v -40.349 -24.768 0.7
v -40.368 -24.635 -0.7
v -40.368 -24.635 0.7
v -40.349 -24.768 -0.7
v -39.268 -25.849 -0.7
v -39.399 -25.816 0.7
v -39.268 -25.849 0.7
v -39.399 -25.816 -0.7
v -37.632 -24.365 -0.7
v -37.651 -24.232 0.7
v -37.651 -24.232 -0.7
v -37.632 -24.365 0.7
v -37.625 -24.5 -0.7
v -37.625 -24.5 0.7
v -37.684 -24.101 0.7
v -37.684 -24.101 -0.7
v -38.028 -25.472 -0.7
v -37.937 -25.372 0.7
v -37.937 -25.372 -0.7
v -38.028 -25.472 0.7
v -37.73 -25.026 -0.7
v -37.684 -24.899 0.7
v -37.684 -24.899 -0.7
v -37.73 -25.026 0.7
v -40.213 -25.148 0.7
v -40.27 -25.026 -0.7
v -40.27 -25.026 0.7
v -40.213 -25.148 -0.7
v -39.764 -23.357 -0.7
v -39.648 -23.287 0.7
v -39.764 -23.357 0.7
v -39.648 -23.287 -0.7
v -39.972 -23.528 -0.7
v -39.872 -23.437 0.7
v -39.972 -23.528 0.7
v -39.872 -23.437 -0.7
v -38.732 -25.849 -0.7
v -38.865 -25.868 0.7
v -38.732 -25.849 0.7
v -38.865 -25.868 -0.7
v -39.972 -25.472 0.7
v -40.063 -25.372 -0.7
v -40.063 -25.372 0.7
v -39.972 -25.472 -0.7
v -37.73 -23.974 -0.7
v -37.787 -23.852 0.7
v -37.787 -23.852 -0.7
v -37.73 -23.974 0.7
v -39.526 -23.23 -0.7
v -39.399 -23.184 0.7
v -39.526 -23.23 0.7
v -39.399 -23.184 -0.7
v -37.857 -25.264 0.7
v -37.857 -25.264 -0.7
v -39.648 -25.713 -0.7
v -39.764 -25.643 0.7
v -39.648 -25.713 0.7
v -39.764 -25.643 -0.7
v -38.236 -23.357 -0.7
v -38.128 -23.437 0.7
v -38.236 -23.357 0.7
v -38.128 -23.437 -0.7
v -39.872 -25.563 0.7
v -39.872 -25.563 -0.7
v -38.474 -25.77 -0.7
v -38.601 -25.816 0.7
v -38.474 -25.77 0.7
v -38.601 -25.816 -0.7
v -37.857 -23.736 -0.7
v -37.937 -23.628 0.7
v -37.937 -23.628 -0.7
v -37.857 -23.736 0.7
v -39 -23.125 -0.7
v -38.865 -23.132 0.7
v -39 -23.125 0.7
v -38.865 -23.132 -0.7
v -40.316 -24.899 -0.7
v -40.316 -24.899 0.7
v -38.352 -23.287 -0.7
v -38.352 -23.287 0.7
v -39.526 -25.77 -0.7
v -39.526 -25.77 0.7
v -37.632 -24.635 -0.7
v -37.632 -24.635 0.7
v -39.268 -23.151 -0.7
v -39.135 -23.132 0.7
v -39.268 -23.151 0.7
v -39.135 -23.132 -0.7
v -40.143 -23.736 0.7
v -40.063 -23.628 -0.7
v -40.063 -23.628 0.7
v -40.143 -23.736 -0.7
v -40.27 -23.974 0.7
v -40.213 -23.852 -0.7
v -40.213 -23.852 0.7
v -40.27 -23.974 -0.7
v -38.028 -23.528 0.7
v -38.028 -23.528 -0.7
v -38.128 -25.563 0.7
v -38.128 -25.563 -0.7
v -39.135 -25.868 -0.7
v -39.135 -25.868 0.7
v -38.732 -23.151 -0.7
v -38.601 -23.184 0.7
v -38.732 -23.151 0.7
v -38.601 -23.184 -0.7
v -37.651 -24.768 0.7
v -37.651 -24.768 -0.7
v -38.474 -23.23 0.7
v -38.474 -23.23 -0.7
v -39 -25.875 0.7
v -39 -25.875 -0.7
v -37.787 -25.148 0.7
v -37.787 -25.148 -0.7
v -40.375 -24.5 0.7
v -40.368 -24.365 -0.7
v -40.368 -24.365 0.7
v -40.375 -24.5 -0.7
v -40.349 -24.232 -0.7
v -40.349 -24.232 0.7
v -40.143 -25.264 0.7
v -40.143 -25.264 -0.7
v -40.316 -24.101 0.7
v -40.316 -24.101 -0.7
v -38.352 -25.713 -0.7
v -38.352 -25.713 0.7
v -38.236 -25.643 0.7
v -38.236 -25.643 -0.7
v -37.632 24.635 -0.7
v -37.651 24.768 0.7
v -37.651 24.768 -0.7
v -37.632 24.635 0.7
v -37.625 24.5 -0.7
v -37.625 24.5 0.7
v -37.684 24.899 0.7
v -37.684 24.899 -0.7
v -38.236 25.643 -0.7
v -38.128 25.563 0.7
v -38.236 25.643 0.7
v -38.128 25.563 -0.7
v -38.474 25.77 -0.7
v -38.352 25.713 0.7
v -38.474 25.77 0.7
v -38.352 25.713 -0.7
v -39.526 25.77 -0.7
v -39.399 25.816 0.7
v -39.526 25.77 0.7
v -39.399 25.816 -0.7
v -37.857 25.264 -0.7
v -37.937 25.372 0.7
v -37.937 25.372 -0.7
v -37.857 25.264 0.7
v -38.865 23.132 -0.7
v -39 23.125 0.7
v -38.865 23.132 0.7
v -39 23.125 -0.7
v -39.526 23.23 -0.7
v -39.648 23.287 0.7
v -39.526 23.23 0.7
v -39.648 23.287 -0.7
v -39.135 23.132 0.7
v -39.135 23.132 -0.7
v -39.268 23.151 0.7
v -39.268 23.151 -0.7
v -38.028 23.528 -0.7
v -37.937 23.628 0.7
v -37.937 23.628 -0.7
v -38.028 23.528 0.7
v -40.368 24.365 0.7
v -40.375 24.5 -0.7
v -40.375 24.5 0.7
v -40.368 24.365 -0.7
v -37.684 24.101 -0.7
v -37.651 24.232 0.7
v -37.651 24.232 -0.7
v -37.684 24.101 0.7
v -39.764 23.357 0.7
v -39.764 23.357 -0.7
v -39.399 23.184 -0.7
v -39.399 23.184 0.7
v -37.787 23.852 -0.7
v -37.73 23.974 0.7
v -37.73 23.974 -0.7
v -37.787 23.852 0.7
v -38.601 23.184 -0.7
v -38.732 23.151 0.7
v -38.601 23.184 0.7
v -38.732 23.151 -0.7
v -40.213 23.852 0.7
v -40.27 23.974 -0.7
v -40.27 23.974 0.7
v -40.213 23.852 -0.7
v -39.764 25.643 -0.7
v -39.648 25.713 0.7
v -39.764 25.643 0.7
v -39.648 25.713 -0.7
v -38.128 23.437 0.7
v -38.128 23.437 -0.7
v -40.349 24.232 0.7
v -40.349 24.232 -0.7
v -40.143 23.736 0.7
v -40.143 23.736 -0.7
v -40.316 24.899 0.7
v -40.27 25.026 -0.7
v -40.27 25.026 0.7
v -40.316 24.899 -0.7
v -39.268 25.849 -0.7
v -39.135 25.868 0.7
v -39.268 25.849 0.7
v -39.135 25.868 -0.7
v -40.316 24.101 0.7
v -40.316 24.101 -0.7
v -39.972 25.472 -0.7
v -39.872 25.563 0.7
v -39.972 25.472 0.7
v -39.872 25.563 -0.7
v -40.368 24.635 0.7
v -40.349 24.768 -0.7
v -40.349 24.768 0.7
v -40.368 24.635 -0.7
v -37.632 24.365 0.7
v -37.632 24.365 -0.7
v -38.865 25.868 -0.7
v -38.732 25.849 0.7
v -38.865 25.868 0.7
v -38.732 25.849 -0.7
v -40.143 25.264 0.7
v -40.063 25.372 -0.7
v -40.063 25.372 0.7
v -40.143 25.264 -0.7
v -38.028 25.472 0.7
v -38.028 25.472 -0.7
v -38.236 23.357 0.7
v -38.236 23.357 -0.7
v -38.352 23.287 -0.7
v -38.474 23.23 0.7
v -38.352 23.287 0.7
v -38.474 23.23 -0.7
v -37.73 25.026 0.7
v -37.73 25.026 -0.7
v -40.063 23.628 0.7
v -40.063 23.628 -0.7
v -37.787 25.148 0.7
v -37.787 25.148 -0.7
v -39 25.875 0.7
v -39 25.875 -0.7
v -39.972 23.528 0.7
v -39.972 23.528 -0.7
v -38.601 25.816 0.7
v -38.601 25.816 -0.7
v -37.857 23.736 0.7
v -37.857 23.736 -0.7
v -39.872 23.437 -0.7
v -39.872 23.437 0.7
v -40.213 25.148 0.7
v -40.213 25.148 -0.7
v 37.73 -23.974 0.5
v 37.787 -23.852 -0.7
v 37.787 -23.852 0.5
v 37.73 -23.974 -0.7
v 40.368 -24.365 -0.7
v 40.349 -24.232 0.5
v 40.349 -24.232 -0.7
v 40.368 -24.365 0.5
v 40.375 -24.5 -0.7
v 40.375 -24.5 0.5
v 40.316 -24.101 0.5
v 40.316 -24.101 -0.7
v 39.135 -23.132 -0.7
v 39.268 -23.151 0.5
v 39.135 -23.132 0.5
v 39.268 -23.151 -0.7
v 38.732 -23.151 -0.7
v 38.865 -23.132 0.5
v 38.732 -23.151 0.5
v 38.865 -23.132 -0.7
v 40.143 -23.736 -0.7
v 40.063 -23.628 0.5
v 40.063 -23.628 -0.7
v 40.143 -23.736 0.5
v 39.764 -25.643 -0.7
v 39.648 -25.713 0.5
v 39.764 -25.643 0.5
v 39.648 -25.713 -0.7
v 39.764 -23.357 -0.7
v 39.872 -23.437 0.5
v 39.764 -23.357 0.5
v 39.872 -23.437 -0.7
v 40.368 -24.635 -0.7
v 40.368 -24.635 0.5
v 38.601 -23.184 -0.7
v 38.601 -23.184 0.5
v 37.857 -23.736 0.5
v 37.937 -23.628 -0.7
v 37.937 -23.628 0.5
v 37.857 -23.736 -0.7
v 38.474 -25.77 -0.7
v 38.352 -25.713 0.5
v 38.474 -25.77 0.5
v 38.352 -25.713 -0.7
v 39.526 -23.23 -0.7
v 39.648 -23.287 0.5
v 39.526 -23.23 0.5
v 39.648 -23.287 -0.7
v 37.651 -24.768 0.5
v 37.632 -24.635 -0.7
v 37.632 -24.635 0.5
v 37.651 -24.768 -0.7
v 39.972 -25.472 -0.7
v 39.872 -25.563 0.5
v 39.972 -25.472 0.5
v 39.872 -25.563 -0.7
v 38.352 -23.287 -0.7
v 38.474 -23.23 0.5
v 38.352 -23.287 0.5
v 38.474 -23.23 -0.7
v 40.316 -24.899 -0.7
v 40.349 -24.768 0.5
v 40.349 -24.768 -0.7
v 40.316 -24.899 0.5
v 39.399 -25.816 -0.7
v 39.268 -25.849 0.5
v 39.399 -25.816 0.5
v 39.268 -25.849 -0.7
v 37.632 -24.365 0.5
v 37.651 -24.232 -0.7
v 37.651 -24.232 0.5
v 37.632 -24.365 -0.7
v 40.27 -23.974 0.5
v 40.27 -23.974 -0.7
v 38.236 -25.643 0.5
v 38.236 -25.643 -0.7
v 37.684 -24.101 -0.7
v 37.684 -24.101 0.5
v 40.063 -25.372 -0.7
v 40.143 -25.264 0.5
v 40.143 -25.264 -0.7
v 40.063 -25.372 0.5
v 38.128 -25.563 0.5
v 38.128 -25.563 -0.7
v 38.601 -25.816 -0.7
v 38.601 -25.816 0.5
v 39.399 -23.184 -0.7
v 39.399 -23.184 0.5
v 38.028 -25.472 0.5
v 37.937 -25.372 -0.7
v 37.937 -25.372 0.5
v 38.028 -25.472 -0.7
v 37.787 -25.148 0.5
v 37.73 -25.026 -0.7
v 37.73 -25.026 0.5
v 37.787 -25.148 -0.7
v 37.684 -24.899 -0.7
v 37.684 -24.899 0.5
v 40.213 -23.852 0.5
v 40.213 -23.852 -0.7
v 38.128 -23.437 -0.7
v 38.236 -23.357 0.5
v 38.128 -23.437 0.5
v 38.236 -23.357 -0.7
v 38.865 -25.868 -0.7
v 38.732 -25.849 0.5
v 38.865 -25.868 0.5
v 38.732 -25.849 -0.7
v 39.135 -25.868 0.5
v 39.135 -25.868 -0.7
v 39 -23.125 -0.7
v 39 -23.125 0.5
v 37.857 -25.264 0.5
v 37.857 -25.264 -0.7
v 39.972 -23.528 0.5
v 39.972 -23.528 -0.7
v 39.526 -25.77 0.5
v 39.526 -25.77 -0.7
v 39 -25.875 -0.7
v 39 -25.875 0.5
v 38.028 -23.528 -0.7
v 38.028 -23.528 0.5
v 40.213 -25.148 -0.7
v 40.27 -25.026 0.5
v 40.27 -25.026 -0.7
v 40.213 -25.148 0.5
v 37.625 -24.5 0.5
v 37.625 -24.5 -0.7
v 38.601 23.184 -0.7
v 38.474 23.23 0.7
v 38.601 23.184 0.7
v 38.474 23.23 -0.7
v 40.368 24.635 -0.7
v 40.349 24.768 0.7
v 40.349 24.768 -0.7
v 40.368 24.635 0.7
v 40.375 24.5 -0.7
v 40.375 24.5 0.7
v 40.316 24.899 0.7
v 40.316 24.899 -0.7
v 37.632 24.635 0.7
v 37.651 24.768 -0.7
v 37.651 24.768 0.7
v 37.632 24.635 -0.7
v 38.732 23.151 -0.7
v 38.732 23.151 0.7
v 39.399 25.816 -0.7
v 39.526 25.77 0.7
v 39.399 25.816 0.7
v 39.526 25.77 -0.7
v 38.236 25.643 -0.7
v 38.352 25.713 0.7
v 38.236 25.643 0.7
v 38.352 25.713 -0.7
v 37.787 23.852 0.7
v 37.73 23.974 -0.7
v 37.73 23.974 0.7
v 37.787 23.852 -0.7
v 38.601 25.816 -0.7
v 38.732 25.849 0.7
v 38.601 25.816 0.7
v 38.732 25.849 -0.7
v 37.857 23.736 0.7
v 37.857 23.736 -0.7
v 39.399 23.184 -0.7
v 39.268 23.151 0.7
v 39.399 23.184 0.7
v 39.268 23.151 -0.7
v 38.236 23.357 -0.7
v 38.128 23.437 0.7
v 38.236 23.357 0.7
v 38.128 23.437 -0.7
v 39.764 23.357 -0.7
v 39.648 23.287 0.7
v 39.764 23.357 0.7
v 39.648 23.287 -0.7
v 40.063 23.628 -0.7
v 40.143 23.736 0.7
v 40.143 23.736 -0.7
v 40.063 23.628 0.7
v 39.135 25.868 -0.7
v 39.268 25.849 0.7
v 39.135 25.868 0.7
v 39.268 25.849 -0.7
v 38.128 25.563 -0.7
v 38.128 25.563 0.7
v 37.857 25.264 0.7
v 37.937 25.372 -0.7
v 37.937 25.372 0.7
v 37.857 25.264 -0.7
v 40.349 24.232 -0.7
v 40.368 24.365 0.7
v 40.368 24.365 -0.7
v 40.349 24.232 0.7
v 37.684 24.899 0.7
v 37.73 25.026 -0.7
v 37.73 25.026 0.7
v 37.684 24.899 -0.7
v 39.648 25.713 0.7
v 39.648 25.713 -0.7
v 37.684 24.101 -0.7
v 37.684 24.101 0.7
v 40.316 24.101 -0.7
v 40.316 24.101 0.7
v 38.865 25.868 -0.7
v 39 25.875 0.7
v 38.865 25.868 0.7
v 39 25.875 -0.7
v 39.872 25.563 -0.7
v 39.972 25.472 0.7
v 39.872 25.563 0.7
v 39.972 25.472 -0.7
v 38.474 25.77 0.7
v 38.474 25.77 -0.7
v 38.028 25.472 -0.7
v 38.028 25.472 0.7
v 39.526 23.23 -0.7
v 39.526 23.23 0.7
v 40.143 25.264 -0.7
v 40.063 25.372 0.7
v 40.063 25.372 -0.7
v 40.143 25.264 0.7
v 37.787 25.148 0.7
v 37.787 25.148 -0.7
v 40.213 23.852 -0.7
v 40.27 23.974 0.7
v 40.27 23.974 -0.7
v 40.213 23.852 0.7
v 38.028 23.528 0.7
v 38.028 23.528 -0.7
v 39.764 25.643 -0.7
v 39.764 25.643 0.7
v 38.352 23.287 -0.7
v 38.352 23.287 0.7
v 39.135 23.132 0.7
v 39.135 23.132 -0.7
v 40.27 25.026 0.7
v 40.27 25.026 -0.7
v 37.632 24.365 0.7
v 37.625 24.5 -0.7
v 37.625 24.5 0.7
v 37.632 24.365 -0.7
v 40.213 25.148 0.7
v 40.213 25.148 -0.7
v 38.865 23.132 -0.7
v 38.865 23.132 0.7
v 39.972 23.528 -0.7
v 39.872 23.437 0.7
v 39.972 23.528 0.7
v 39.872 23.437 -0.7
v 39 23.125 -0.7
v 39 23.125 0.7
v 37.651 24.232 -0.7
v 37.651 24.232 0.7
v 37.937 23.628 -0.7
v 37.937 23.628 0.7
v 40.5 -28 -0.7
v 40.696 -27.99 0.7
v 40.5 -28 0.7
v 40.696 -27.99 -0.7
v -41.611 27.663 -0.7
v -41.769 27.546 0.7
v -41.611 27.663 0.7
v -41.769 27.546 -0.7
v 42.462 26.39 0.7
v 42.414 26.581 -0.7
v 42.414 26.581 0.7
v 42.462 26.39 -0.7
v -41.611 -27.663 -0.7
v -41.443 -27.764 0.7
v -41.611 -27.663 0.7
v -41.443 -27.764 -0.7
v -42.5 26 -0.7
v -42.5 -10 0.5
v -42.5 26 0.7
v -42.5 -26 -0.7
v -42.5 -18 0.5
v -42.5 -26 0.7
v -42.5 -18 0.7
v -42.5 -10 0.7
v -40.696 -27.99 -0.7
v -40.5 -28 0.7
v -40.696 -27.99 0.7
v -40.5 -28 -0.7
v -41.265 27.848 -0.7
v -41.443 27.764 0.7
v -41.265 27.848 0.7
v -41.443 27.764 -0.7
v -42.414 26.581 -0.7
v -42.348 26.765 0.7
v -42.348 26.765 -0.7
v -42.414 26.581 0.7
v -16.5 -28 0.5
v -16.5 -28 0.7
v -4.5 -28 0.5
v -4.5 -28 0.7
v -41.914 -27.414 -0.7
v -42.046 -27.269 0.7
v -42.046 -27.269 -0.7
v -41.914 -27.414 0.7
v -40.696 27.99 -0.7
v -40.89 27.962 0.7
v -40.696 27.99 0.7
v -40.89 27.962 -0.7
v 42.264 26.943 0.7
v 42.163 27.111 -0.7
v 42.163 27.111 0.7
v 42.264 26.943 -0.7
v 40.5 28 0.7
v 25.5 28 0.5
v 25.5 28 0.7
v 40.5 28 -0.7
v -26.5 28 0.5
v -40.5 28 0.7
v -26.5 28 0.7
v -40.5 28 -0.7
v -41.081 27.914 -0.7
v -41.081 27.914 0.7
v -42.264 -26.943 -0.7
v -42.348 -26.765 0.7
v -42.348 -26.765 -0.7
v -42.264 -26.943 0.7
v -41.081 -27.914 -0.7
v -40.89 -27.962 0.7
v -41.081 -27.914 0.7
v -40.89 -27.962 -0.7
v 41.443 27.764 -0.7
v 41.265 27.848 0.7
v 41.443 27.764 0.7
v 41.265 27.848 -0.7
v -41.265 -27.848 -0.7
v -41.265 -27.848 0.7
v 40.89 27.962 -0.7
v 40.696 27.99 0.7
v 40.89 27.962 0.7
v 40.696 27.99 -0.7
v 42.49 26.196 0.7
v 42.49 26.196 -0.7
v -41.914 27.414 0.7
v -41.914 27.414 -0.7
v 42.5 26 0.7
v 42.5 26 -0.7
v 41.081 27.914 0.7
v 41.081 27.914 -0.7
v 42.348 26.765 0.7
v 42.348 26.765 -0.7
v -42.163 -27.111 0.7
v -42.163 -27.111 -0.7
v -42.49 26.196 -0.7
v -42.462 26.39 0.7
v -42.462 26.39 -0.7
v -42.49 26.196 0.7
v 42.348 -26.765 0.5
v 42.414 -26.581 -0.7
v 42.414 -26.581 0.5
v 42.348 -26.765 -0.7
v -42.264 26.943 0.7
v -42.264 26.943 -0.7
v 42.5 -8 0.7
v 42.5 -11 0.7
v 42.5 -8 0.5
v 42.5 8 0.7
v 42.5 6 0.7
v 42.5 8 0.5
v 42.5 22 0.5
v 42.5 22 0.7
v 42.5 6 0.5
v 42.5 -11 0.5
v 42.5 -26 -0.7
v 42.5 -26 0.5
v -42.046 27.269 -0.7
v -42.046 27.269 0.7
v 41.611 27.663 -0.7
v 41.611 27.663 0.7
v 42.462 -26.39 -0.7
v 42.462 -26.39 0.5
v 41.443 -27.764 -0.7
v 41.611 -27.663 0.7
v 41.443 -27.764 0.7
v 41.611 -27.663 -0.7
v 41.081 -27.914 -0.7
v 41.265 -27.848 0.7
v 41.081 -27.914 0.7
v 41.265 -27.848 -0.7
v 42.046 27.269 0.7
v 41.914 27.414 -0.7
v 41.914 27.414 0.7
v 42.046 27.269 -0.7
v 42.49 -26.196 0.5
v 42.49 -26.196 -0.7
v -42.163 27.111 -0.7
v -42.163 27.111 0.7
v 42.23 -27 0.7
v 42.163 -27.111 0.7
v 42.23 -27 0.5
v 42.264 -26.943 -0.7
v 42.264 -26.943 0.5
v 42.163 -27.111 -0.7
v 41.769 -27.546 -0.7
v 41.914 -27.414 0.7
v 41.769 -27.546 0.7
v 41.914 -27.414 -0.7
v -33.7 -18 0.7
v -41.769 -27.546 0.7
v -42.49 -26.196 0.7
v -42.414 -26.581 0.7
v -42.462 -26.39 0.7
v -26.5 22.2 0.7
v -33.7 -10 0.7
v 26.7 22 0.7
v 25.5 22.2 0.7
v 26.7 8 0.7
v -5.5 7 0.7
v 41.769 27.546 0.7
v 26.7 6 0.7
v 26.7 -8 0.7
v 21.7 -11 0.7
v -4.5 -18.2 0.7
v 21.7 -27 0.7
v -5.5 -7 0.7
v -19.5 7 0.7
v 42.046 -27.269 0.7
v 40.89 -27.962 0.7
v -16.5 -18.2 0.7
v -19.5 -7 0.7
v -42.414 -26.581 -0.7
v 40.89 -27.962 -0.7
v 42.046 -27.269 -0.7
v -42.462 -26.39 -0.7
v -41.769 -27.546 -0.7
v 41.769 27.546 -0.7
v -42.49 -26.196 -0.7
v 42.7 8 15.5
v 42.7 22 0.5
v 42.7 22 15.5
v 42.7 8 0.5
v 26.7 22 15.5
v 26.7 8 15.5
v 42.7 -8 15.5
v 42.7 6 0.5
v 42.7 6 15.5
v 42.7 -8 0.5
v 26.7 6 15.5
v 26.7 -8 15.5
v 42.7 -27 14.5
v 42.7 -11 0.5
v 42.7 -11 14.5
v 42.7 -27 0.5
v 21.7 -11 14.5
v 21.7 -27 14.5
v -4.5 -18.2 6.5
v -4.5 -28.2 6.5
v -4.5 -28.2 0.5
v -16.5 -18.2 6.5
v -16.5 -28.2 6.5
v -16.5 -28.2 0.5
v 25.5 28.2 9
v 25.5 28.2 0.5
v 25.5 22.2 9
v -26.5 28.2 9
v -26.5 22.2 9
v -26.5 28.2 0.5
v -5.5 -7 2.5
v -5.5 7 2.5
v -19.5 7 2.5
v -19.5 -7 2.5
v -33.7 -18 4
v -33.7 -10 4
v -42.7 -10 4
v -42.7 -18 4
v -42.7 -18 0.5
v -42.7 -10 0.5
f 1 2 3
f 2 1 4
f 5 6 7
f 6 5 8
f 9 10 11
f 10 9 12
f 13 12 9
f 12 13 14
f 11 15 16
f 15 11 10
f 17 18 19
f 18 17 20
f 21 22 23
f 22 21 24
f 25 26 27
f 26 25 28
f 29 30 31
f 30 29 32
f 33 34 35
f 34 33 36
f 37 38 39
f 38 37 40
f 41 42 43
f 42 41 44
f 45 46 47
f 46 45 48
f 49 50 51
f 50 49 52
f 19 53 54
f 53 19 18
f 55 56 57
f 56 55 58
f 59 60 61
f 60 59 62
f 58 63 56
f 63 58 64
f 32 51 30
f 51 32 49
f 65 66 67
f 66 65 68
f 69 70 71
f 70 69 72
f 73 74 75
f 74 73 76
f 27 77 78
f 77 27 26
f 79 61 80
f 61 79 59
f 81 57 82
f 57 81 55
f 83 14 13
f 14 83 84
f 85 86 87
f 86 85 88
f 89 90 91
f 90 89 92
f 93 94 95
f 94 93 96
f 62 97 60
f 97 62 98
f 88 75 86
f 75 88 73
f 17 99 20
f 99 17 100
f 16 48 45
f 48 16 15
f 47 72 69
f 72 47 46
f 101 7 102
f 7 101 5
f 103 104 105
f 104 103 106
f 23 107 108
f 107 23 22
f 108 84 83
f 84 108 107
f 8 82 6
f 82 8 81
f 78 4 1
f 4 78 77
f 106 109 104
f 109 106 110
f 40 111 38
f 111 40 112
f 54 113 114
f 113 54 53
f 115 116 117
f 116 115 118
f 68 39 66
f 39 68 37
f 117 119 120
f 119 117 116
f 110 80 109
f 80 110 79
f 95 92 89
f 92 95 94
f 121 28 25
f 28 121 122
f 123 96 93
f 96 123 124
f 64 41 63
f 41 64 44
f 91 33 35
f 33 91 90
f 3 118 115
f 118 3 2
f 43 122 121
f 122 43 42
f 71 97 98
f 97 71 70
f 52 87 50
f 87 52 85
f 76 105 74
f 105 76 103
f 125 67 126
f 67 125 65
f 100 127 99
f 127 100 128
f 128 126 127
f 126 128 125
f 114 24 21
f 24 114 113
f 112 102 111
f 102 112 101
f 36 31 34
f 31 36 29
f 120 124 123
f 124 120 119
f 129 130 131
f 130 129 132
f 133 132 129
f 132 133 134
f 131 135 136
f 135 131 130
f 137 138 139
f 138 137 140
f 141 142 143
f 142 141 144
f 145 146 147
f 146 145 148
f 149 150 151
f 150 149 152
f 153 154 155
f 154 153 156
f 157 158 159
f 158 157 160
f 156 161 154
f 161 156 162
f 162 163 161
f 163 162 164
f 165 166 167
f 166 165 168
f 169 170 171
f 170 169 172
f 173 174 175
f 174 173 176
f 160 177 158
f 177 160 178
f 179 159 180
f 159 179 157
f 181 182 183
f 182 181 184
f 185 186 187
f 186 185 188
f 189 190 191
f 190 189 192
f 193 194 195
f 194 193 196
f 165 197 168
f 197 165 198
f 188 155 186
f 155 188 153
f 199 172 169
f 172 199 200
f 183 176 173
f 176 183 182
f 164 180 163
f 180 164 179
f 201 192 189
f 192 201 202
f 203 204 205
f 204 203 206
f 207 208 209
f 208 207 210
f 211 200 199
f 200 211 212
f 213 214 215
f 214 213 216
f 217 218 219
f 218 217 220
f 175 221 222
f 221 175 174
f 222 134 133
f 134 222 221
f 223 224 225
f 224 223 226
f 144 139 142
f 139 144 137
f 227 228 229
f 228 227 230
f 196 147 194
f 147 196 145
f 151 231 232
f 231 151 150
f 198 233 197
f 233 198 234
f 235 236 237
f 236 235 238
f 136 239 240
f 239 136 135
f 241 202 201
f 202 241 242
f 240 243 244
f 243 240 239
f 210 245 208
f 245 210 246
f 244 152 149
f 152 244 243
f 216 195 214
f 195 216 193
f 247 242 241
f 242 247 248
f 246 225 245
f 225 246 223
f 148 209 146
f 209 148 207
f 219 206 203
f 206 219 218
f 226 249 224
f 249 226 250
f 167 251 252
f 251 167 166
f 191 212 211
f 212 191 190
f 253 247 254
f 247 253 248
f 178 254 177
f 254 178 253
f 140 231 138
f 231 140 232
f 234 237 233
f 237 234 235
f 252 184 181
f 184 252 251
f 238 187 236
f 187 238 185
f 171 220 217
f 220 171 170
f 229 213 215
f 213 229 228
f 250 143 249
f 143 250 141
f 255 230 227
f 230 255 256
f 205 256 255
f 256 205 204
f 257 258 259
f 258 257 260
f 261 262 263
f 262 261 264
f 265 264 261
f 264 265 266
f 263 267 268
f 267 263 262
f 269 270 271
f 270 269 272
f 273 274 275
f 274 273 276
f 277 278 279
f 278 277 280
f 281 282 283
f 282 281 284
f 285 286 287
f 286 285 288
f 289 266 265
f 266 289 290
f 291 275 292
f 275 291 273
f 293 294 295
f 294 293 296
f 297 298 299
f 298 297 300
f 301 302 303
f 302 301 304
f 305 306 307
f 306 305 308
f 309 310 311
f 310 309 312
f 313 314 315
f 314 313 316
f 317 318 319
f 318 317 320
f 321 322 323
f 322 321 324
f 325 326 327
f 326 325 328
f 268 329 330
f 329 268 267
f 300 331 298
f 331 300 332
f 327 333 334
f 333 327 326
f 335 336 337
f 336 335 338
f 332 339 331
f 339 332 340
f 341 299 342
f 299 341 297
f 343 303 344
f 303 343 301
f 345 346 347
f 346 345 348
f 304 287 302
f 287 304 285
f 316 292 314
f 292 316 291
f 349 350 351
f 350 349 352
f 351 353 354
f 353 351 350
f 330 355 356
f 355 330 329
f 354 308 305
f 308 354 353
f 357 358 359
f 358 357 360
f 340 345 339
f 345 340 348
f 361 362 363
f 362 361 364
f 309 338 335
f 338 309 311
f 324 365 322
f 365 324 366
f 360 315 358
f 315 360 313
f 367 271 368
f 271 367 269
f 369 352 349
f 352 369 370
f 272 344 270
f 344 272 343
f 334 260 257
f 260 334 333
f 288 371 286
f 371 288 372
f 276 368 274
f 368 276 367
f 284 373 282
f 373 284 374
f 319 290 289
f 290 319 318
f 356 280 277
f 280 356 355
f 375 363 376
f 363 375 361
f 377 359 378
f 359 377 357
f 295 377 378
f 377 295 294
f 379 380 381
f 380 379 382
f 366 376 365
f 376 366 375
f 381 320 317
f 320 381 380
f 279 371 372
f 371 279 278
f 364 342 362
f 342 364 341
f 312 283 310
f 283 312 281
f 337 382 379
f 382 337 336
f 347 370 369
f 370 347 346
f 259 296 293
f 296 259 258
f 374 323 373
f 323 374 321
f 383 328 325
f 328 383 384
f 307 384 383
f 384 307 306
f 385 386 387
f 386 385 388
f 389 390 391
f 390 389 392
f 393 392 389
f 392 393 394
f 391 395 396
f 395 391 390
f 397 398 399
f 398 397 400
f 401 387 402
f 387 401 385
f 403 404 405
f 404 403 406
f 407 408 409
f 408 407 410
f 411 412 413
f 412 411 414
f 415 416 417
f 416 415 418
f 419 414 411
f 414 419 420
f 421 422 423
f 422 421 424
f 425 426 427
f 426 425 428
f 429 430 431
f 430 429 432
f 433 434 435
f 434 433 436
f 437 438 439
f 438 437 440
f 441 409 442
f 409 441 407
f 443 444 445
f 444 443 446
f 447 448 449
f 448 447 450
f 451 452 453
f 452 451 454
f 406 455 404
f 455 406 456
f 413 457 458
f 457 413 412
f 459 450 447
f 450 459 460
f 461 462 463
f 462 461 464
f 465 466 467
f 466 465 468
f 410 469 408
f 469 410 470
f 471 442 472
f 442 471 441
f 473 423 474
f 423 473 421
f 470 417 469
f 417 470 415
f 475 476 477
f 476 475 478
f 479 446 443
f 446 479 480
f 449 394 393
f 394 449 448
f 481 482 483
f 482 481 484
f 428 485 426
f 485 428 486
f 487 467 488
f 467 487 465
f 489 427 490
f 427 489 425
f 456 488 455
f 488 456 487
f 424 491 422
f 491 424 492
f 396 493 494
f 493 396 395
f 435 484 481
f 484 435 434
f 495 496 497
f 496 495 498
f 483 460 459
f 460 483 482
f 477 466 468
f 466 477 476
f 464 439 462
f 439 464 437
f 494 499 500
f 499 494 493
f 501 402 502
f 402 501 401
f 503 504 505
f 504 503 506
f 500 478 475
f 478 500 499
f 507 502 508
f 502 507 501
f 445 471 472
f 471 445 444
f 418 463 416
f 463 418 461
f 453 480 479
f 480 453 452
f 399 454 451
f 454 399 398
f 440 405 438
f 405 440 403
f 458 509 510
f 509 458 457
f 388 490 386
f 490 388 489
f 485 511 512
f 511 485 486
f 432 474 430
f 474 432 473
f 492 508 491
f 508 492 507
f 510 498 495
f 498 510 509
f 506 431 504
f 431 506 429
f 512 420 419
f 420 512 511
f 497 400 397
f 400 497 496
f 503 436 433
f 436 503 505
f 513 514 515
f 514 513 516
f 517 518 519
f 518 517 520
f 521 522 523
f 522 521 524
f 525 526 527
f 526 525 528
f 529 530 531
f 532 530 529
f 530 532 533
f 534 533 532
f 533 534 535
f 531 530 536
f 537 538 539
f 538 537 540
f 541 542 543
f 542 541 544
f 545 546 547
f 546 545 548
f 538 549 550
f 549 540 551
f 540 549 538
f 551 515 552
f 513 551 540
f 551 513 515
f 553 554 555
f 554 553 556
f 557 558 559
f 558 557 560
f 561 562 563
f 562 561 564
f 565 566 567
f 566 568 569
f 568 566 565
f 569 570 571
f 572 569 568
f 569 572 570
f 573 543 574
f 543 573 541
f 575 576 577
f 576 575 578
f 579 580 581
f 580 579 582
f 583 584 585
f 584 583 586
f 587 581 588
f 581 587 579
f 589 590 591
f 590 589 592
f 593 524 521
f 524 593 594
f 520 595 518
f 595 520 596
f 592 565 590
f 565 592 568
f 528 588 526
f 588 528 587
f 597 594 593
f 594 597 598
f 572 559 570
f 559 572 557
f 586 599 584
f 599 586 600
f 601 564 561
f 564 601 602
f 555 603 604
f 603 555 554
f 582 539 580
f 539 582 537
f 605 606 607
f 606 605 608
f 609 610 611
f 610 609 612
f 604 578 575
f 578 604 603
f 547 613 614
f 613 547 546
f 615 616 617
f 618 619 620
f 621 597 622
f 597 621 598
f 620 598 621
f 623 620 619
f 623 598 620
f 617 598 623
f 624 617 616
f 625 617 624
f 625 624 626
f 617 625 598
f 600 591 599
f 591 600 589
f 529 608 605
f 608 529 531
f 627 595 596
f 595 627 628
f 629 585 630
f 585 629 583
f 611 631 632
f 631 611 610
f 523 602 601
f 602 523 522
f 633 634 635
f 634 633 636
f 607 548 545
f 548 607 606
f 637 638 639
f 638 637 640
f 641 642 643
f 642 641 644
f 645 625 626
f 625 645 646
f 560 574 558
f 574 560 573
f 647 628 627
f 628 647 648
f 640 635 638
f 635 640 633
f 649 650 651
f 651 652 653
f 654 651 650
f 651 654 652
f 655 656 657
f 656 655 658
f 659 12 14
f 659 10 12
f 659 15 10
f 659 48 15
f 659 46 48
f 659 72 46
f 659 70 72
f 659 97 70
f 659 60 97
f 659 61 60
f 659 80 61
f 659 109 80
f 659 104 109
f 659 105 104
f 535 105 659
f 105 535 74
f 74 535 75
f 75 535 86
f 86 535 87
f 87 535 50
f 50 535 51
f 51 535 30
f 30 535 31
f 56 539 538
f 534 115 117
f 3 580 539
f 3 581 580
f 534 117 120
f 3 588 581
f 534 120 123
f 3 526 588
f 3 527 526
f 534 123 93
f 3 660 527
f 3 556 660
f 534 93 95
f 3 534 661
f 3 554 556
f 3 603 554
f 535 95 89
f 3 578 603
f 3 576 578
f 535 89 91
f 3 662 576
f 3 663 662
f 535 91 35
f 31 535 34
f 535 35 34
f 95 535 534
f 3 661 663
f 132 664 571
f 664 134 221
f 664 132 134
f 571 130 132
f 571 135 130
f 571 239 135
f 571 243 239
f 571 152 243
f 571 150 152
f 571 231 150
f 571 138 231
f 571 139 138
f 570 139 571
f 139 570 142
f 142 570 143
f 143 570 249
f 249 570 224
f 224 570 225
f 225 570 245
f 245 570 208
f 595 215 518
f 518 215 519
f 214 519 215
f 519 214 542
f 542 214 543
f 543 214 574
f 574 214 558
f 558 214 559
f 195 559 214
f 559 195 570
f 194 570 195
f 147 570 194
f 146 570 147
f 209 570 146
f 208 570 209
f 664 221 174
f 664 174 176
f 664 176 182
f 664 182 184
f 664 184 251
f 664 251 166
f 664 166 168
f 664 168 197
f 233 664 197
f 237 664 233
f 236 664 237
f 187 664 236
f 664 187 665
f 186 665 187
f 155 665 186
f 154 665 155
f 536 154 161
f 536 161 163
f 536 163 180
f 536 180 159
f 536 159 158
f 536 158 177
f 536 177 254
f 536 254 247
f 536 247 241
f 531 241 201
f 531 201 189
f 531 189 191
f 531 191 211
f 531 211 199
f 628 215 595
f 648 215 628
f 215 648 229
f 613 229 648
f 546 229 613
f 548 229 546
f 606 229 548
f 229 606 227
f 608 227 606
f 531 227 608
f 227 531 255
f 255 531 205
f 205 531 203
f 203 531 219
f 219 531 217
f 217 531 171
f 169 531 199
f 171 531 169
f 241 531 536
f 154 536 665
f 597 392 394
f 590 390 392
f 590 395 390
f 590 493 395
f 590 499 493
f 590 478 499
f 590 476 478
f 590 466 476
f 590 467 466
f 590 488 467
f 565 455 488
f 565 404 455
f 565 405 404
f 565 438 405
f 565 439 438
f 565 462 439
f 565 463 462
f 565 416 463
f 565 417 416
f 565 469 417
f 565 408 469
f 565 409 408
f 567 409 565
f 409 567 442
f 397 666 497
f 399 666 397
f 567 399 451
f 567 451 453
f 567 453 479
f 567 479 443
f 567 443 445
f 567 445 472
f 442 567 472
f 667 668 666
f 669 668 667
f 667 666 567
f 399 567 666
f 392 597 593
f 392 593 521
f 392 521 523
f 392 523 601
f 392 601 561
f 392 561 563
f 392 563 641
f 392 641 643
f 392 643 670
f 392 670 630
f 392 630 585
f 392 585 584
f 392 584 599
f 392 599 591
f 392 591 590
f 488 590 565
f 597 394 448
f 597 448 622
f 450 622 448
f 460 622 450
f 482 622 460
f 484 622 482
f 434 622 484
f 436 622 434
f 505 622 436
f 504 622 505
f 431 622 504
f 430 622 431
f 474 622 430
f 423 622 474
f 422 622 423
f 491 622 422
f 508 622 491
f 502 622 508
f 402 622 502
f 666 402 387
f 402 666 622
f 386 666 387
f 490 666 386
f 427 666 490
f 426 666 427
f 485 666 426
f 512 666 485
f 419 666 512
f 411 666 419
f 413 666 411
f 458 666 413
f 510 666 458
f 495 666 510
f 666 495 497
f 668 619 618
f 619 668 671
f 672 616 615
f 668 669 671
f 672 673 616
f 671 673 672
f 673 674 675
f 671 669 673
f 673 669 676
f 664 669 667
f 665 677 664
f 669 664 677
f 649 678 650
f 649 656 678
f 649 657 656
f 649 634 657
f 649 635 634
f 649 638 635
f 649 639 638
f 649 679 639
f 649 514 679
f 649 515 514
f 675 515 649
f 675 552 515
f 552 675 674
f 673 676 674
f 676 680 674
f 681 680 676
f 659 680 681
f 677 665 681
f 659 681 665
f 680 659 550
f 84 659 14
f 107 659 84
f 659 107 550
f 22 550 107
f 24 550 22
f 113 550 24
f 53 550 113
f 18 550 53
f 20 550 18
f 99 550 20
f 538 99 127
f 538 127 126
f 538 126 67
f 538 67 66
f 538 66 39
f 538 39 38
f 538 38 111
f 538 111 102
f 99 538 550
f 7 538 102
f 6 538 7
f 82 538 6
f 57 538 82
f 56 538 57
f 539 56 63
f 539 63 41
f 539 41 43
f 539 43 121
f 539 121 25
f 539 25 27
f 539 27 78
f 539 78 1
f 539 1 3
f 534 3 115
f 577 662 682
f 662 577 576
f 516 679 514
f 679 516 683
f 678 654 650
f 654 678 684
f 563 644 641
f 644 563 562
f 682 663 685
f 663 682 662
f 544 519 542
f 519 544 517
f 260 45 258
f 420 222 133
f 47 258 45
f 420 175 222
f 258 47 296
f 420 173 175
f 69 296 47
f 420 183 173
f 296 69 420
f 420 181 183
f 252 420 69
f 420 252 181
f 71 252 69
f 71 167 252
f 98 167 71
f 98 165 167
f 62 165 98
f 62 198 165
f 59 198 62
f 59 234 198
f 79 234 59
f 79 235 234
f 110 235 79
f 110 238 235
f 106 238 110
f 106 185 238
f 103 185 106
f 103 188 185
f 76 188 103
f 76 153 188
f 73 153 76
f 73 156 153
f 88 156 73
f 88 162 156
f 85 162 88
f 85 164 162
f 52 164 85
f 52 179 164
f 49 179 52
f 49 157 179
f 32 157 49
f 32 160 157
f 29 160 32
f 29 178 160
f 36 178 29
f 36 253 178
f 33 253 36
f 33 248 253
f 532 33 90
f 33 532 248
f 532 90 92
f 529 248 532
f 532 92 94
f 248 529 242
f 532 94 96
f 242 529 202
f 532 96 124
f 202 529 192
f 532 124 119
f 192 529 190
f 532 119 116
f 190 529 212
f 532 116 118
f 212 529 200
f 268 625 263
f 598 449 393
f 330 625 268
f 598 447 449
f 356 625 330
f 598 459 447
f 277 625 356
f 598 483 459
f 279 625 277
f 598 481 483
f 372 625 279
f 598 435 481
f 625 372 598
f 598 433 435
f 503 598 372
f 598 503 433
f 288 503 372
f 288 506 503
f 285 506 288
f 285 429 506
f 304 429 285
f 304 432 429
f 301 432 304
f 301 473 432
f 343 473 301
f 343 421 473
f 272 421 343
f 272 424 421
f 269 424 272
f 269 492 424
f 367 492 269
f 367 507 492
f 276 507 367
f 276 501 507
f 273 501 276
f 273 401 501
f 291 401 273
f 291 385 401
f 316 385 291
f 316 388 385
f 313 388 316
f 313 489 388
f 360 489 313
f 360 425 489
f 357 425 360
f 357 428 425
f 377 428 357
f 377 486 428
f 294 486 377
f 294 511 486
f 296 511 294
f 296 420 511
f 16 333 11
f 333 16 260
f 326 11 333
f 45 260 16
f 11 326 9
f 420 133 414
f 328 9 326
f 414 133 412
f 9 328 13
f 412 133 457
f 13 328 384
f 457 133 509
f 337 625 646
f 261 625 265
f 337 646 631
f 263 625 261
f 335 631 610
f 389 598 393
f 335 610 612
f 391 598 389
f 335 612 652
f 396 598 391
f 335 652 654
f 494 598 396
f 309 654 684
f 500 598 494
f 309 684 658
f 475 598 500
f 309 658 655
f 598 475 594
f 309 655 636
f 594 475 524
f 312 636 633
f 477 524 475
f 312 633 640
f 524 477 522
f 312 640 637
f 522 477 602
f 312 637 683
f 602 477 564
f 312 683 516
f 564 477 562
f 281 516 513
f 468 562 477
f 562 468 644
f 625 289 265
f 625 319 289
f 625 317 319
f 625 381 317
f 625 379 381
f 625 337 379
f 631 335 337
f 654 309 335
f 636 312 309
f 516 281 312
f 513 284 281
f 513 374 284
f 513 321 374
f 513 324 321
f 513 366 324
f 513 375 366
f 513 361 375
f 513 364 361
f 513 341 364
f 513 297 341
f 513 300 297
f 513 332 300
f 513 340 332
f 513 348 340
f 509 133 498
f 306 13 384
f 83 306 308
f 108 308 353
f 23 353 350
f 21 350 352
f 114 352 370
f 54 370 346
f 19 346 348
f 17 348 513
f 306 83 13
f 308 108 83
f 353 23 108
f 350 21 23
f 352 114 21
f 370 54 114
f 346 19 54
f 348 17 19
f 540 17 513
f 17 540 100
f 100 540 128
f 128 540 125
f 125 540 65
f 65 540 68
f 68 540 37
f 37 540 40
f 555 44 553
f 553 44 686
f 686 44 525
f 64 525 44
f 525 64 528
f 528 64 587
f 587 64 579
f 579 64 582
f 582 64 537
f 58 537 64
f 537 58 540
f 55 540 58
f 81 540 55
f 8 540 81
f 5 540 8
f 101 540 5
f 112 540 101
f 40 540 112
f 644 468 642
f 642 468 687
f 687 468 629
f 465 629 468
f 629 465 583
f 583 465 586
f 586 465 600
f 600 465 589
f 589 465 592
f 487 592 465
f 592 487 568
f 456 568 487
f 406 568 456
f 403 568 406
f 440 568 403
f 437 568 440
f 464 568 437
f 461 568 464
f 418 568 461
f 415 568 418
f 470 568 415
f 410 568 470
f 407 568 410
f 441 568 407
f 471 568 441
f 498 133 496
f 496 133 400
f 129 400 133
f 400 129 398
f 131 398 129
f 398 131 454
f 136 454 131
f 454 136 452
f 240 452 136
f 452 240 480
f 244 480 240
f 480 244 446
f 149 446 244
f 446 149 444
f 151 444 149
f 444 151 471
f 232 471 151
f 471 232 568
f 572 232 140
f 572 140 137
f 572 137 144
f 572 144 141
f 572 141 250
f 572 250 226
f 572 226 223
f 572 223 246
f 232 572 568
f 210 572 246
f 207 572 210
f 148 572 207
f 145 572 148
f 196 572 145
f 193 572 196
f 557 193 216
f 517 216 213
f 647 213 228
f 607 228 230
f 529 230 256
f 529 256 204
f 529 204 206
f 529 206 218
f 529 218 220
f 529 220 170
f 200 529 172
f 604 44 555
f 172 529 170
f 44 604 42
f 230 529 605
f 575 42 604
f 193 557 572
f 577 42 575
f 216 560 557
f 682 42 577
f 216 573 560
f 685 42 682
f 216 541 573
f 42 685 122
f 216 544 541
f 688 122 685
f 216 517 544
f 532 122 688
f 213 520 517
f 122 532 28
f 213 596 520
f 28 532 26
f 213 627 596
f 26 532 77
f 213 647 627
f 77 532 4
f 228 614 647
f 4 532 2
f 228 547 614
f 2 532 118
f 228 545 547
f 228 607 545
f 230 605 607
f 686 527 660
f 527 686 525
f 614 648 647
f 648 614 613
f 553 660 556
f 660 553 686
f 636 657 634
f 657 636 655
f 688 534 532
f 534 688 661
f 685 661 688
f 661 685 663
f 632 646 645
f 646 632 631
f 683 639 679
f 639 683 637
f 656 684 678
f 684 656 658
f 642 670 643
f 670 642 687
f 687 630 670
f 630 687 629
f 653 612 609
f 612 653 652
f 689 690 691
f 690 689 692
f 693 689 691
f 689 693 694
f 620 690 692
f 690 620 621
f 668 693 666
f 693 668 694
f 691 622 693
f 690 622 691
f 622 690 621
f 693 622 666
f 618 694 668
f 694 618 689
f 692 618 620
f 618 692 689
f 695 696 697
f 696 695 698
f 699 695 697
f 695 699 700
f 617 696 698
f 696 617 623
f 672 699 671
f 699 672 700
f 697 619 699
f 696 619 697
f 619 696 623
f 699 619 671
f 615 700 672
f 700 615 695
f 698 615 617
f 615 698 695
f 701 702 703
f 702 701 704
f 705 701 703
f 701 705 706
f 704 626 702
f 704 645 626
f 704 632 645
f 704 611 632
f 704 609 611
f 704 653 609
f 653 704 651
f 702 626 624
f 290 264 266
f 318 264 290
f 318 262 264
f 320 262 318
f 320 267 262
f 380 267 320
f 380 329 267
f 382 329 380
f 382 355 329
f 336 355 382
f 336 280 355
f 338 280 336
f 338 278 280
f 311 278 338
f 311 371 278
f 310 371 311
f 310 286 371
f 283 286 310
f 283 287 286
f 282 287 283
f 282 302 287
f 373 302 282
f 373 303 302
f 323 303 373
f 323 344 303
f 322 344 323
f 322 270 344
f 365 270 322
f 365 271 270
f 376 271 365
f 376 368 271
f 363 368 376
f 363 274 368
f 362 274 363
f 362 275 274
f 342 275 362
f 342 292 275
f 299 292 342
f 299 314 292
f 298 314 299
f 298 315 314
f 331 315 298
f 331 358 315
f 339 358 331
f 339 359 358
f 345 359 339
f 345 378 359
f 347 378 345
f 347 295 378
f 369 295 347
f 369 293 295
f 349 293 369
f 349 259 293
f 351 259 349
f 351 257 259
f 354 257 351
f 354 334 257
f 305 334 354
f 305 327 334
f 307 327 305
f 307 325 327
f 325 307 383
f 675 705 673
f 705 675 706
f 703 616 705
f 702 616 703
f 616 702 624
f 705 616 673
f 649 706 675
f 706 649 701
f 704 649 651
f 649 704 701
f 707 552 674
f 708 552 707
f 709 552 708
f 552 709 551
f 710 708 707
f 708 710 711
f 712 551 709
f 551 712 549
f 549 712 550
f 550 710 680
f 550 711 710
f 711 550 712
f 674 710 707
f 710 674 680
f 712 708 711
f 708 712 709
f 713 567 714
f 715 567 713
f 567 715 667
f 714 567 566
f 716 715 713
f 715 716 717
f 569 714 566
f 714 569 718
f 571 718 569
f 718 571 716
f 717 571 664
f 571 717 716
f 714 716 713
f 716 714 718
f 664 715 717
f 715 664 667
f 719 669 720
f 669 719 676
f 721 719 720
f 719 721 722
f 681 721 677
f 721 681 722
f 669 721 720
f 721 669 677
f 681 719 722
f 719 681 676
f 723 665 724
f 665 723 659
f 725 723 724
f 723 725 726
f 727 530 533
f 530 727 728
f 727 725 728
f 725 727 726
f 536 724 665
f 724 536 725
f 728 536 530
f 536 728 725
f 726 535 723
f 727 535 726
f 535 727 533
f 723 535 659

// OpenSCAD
$fn = 64;

// Parameters (target PCB size)
pcb_length = 85.0;   // X
pcb_width  = 56.0;   // Y
pcb_thickness = 1.4; // Z

// Small overlap to guarantee watertight unions
overlap = 0.2;

// Helper: rounded rectangle prism (centered)
module rounded_box(size=[10,10,2], r=1, center=true) {
    x = size[0]; y = size[1]; z = size[2];
    rr = min(r, x/2, y/2);
    translate(center ? [0,0,0] : [x/2,y/2,z/2])
        linear_extrude(height=z, center=true)
            offset(r=rr)
                square([x-2*rr, y-2*rr], center=true);
}

// PCB with mounting holes (holes are cut, but model remains one connected solid)
module pcb() {
    hole_d = 2.75;
    hole_r = hole_d/2;

    // Typical SBC hole offsets from edges (kept parametric and derived from board dims)
    edge_x = 3.5;
    edge_y = 3.5;

    xh = pcb_length/2 - edge_x;
    yh = pcb_width/2  - edge_y;

    difference() {
        color([0.0, 0.4, 0.2])
            rounded_box([pcb_length, pcb_width, pcb_thickness], r=2.0, center=true);

        // 4 mounting holes
        for (sx = [-1, 1], sy = [-1, 1])
            translate([sx*xh, sy*yh, 0])
                cylinder(h=pcb_thickness + 2*overlap, r=hole_r, center=true);
    }
}

// Simple connector/component blocks that are guaranteed to touch the PCB top surface
module components() {
    z_top = pcb_thickness/2;

    // USB-A stack (2 ports) along +X edge
    usb_w = 16.0;   // along X (depth into board)
    usb_l = 14.0;   // along Y
    usb_h = 15.0;   // above PCB
    usb_gap = 2.0;

    usb_xc = pcb_length/2 - usb_w/2 + overlap; // overlaps into PCB
    usb_y1 = pcb_width/2 - usb_l/2 - 6.0;
    usb_y2 = usb_y1 - (usb_l + usb_gap);

    for (yy = [usb_y1, usb_y2])
        color([0.75, 0.75, 0.75])
            translate([usb_xc, yy, z_top + usb_h/2 - overlap])
                cube([usb_w, usb_l, usb_h], center=true);

    // Ethernet block near USBs along +X edge
    eth_w = 21.0;
    eth_l = 16.0;
    eth_h = 14.0;

    eth_xc = pcb_length/2 - eth_w/2 + overlap;
    eth_yc = usb_y2 - (usb_l/2 + eth_l/2 + 3.0);

    color([0.65, 0.65, 0.65])
        translate([eth_xc, eth_yc, z_top + eth_h/2 - overlap])
            cube([eth_w, eth_l, eth_h], center=true);

    // HDMI block along -Y edge
    hdmi_w = 12.0;  // along X
    hdmi_l = 10.0;  // along Y (depth into board)
    hdmi_h = 6.0;

    hdmi_yc = -pcb_width/2 + hdmi_l/2 - overlap;
    hdmi_xc = -pcb_length/2 + 32.0;

    color([0.25, 0.25, 0.25])
        translate([hdmi_xc, hdmi_yc, z_top + hdmi_h/2 - overlap])
            cube([hdmi_w, hdmi_l, hdmi_h], center=true);

    // 40-pin header block along +Y edge
    hdr_w = 52.0;  // along X
    hdr_l = 6.0;   // along Y (depth into board)
    hdr_h = 8.5;

    hdr_yc = pcb_width/2 - hdr_l/2 + overlap;
    hdr_xc = -pcb_length/2 + 42.0;

    color([0.1, 0.1, 0.1])
        translate([hdr_xc, hdr_yc, z_top + hdr_h/2 - overlap])
            cube([hdr_w, hdr_l, hdr_h], center=true);

    // Main SoC block on top
    soc_s = 14.0;
    soc_h = 2.0;
    soc_xc = -pcb_length/2 + 30.0;
    soc_yc = 0;

    color([0.15, 0.15, 0.15])
        translate([soc_xc, soc_yc, z_top + soc_h/2 - overlap])
            cube([soc_s, soc_s, soc_h], center=true);

    // USB-C / power block along -X edge
    pwr_w = 9.0;   // along X (depth into board)
    pwr_l = 8.0;   // along Y
    pwr_h = 3.5;

    pwr_xc = -pcb_length/2 + pwr_w/2 - overlap;
    pwr_yc = -pcb_width/2 + 14.0;

    color([0.7, 0.7, 0.7])
        translate([pwr_xc, pwr_yc, z_top + pwr_h/2 - overlap])
            cube([pwr_w, pwr_l, pwr_h], center=true);
}

// Final Output: one connected solid (PCB + components all touching/overlapping)
union() {
    pcb();
    components();
}
